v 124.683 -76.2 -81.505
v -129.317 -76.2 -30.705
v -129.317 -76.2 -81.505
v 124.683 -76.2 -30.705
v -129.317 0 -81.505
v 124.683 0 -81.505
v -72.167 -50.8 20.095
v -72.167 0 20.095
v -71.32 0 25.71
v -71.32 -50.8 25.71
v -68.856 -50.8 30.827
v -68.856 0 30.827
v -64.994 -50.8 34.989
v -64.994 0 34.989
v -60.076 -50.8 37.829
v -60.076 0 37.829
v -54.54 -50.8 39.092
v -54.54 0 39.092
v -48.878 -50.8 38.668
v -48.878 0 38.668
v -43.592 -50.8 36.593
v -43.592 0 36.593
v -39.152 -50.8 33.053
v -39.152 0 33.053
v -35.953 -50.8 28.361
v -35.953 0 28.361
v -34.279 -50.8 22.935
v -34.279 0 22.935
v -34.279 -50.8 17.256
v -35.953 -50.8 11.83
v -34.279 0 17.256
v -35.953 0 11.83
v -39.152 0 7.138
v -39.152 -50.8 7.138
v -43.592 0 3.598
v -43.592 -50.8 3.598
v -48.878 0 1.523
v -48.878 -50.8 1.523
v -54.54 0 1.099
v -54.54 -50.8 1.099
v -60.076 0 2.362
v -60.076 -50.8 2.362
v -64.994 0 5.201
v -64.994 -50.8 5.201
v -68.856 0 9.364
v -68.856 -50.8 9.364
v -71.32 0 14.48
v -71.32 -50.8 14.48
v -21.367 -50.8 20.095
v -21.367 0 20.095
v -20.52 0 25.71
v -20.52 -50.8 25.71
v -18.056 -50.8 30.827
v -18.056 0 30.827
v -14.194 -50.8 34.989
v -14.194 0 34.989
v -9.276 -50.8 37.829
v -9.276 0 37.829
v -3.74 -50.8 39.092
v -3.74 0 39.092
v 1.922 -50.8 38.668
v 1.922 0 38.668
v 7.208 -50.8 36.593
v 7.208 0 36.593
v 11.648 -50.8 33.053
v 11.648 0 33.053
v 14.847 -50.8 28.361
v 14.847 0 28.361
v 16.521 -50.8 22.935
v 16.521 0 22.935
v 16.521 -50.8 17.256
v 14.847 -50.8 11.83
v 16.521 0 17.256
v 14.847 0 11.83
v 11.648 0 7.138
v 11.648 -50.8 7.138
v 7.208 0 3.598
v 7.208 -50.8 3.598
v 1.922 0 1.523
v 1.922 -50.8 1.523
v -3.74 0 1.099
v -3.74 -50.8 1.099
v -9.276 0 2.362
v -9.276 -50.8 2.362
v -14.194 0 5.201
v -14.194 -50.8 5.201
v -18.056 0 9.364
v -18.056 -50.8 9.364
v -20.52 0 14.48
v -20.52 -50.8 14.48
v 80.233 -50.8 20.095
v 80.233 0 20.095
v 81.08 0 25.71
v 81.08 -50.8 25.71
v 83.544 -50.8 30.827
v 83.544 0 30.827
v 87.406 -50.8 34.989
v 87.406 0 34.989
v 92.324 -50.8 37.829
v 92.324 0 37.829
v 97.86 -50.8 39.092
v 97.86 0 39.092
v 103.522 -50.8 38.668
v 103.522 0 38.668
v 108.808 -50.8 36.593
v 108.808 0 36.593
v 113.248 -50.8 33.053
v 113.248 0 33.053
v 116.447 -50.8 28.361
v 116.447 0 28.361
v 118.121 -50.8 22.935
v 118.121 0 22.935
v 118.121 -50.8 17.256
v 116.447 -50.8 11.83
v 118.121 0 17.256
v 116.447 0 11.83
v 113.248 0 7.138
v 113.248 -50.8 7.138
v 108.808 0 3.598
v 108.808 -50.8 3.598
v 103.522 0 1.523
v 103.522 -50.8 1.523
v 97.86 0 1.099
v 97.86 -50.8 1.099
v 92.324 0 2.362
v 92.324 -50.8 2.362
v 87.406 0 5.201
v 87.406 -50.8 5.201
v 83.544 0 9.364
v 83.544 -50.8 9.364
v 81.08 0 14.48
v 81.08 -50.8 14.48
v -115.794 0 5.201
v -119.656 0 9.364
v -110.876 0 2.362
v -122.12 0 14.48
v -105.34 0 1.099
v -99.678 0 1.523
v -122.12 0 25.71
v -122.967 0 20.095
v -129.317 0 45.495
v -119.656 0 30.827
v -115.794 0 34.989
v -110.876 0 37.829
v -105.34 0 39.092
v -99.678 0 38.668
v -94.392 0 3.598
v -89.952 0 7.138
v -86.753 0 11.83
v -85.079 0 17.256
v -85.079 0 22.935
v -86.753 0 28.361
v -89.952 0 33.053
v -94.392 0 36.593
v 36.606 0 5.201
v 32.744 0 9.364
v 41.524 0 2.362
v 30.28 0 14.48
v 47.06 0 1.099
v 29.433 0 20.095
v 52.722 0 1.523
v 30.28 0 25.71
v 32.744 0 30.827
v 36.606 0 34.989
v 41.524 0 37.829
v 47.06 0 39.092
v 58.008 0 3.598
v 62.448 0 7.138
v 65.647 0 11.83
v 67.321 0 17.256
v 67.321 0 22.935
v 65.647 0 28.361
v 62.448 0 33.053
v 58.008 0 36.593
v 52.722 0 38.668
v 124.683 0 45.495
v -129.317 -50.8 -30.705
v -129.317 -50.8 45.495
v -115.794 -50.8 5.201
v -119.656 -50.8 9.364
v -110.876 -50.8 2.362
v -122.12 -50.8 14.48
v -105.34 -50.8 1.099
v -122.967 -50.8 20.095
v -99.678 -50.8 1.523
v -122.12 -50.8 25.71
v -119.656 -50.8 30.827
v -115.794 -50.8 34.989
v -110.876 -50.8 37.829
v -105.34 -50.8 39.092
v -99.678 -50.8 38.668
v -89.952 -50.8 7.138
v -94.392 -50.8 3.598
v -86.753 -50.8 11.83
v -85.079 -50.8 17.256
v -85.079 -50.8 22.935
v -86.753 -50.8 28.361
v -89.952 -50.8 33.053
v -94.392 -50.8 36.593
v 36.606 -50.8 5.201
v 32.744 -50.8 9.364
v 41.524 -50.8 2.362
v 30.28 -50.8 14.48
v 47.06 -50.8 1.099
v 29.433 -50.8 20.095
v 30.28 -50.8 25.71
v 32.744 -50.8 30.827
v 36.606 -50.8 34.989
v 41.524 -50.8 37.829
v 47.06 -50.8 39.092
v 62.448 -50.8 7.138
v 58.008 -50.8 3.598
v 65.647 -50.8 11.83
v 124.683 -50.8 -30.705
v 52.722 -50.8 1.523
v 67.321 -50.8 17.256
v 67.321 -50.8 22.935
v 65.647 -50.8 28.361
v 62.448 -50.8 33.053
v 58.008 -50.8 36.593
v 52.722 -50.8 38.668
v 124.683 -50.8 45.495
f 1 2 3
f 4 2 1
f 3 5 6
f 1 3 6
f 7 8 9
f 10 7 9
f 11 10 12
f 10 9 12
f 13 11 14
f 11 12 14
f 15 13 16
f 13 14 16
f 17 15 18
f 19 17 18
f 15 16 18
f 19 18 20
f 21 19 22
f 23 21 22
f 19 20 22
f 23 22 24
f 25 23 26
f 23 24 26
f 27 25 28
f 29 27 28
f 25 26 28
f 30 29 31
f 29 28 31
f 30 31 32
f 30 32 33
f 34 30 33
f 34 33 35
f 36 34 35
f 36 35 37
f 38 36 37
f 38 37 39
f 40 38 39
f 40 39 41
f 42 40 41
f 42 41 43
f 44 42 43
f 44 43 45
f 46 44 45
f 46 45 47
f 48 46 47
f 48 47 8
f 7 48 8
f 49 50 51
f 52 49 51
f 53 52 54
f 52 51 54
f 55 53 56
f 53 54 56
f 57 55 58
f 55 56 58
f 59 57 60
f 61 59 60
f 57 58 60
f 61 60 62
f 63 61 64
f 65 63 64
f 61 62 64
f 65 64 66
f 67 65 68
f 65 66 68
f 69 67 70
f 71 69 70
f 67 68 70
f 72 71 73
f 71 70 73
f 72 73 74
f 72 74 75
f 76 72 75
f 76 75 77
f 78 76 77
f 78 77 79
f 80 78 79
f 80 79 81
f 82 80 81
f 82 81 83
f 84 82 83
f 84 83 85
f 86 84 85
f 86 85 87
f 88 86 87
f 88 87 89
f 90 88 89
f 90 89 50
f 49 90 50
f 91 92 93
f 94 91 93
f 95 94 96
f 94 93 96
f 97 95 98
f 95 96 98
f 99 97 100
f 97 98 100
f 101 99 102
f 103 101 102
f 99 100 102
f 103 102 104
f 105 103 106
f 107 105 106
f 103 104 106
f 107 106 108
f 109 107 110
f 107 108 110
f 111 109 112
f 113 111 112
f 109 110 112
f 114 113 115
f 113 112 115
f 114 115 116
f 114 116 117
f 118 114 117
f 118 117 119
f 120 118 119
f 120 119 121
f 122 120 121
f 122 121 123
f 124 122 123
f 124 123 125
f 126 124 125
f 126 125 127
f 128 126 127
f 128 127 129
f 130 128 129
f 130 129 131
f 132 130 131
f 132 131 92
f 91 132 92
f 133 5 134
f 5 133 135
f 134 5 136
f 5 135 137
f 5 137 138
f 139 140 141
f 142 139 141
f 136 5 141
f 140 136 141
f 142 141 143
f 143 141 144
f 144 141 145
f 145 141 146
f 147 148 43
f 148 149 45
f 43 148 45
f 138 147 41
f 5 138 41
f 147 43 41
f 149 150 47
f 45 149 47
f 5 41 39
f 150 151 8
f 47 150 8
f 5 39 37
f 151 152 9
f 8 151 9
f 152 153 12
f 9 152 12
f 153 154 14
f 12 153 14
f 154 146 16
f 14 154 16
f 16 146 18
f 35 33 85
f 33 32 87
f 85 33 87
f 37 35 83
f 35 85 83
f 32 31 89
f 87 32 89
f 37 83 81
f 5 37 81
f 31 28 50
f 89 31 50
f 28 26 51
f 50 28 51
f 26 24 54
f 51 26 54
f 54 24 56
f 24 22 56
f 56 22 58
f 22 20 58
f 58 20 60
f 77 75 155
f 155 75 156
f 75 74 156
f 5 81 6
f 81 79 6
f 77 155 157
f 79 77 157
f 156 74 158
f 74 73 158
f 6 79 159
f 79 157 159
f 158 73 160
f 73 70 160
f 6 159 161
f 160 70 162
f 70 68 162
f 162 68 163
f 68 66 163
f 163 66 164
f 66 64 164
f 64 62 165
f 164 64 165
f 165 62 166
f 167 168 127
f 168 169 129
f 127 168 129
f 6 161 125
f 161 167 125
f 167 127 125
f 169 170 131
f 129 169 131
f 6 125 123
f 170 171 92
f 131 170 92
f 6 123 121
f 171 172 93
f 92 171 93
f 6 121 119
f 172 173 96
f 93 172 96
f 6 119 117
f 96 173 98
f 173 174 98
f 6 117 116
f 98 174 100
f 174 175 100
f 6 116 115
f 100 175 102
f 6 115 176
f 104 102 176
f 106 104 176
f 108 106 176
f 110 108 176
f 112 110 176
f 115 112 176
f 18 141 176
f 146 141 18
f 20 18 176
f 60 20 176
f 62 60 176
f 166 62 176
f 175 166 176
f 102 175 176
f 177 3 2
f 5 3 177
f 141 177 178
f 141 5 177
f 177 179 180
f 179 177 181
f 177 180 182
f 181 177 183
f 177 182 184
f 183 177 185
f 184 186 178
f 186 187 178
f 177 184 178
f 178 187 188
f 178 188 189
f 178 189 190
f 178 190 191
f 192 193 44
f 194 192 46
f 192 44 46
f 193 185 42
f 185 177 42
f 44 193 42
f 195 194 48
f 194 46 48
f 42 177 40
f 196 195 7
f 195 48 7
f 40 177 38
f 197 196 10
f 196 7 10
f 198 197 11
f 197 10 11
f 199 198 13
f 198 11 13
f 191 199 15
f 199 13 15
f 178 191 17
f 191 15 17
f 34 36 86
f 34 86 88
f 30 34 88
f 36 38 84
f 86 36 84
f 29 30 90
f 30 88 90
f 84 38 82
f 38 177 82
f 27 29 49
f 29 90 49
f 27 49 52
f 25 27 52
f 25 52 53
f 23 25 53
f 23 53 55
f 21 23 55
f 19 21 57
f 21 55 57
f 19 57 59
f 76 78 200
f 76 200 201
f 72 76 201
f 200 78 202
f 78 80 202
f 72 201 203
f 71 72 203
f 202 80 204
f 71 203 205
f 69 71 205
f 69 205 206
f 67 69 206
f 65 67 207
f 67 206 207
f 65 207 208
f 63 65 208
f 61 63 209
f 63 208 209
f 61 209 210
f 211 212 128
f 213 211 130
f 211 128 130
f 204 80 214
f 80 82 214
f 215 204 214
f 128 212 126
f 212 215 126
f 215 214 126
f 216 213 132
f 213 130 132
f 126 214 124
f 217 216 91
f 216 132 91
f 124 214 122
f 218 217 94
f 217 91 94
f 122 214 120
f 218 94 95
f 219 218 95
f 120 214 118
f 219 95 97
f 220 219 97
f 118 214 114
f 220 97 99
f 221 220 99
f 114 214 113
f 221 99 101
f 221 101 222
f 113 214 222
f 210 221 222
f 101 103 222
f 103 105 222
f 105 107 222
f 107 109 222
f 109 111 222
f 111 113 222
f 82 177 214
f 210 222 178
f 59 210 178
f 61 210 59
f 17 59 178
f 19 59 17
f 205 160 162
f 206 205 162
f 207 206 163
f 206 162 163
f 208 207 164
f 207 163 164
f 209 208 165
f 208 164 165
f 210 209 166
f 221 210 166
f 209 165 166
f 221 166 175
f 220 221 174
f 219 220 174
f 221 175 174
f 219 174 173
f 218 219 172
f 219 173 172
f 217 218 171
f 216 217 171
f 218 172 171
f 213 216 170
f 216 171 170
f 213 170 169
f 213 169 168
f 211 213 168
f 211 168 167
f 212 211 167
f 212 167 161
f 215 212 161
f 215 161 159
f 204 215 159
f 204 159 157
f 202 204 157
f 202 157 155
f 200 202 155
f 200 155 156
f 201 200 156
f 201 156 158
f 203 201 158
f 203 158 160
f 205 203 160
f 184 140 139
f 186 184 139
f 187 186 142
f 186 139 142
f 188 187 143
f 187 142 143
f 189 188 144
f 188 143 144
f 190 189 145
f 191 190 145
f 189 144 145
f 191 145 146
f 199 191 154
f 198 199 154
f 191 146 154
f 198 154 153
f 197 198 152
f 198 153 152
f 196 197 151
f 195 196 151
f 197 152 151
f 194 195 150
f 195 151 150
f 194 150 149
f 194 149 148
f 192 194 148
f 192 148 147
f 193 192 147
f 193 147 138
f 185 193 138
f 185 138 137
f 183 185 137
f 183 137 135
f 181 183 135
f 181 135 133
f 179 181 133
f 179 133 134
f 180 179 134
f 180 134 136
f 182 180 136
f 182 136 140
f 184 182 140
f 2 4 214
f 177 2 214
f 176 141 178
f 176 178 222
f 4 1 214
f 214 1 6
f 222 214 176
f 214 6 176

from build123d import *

# Parameters (mm, degrees)
F0_W     = 254
F0_H     = 127
F1_DEPTH = 76.2
F2_W     = 25.4
F2_H     = 76.2
F3_DEPTH = 255.778
F5_D     = 38.1
F6_D     = 38.1
F7_D     = 38.1


with BuildPart() as f1:
    # F0 (on Front) → F1 (new body)
    with BuildSketch(Plane.XZ):
        with Locations((-2.316557, -18.004625)):
            Rectangle(F0_W, F0_H)
    extrude(amount=F1_DEPTH)

    # F2 (on face) → F3 (cut)
    with BuildSketch(Plane.YZ.offset(124.683443)):
        with Locations((-63.5, 7.395375)):
            Rectangle(F2_W, F2_H)
    extrude(amount=-F3_DEPTH, mode=Mode.SUBTRACT)

    # F5 (through all)
    with Locations(Plane.XZ.offset(50.8)):
        with Locations((-103.916557, 20.095375)):
            Hole(F5_D / 2)

    # F6 (through all)
    with Locations(Plane.XZ.offset(50.8)):
        with Locations((-53.116557, 20.095375)):
            Hole(F6_D / 2)

    # F7 (through all)
    with Locations(Plane.XZ.offset(50.8)):
        with Locations((-2.316557, 20.095375), (48.483443, 20.095375), (99.283443, 20.095375)):
            Hole(F7_D / 2)


solid = f1.part
